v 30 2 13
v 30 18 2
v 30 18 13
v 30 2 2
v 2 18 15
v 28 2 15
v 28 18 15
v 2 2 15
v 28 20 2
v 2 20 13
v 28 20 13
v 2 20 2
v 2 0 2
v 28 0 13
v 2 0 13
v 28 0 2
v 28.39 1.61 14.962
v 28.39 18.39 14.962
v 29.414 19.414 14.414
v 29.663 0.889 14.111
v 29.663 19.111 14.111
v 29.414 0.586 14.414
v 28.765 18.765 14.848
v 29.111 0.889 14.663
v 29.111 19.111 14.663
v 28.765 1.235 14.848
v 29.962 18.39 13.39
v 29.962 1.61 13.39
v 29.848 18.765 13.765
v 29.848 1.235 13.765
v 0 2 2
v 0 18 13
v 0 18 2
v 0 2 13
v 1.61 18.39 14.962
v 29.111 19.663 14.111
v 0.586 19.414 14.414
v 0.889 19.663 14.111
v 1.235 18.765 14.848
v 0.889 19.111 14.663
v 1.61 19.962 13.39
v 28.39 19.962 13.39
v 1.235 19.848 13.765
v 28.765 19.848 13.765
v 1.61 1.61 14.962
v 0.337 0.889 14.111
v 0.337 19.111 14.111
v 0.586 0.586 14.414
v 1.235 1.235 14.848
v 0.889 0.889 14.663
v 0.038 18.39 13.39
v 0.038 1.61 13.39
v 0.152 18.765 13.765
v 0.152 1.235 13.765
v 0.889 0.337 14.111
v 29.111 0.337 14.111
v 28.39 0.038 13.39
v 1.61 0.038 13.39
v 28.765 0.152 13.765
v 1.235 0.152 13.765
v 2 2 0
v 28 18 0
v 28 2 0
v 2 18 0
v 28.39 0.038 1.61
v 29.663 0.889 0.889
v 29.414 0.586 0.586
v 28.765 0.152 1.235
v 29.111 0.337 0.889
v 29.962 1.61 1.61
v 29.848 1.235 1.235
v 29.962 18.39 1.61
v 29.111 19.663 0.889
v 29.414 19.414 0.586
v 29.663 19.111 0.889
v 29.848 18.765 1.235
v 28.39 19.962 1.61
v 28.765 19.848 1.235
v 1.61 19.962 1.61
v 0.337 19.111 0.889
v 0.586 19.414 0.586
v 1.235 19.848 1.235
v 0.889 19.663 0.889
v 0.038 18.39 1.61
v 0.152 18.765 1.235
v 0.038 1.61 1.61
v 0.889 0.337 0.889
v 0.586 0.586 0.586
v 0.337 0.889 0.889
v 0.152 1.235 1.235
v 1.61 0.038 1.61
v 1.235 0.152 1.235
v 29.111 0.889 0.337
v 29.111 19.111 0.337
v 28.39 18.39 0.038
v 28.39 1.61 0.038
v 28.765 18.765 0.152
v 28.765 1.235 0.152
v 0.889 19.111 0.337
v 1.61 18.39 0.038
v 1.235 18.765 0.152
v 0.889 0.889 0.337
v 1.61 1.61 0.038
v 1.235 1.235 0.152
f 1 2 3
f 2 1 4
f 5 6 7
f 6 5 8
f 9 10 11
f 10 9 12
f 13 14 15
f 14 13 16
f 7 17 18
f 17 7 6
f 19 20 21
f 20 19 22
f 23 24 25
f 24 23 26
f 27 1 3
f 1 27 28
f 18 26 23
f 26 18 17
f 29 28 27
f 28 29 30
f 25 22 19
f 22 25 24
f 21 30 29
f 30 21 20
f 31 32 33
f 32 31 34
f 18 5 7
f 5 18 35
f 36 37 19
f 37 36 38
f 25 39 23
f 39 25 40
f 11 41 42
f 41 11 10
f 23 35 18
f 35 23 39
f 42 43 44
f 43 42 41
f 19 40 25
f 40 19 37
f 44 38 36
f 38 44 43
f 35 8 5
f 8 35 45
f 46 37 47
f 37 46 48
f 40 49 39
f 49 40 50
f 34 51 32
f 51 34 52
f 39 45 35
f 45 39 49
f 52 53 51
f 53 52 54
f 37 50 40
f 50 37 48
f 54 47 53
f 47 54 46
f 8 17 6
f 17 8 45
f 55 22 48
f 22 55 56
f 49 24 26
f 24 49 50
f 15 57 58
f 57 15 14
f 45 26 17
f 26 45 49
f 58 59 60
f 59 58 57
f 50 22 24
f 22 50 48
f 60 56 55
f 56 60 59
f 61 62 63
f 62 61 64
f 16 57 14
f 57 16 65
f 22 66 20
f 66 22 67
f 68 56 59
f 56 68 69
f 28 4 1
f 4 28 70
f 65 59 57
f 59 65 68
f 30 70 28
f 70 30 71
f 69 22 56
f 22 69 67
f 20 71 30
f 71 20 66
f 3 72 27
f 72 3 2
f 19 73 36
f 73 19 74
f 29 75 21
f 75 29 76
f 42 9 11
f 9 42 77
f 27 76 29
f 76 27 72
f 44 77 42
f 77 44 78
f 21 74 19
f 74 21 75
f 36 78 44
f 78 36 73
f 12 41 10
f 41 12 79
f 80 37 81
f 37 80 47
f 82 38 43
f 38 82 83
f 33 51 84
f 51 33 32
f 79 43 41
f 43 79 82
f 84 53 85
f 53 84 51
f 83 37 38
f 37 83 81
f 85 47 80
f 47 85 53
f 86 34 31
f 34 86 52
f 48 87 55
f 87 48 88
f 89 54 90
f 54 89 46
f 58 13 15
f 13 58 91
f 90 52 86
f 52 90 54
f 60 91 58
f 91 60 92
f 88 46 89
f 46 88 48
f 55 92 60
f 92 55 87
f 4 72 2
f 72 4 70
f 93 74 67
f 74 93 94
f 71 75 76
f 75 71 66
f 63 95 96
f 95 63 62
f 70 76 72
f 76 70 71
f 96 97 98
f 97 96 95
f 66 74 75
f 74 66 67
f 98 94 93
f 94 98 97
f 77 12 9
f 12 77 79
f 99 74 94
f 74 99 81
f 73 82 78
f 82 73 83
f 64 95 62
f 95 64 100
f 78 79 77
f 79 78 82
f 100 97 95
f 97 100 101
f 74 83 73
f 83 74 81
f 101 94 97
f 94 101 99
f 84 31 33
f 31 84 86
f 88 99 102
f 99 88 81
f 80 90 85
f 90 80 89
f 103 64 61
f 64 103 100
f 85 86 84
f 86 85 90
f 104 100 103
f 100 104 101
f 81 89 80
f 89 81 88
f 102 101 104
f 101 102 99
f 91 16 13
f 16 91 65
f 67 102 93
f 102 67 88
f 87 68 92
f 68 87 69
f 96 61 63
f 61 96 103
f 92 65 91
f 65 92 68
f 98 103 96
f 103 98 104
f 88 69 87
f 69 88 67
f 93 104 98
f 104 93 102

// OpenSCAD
module rond_corner(rayon,deep) {
    difference() {
        cube([rayon,deep,rayon]);
        rotate([-90,0,0]) cylinder(deep, r=rayon,$fn=32);
    }
}


module rondcube(rayon,width,deep, height, top=true, bottom=true, side=true) {
    difference() {
        cube([width, deep, height]);
        if (top) {
            translate([width-rayon,0,height-rayon]) rond_corner(rayon,deep);
            translate([width,deep-rayon,height-rayon]) rotate([0,0,90]) rond_corner(rayon,width);
            translate([rayon,deep,height-rayon]) rotate([0,0,180]) rond_corner(rayon,deep);
            translate([0,rayon,height-rayon]) rotate([0,0,270]) rond_corner(rayon,width);
        }
        if (side) {
            translate([width-rayon,rayon,0]) rotate([90,0,0]) rond_corner(rayon,height);
            translate([width-rayon,deep-rayon,0]) rotate([90,0,90]) rond_corner(rayon,height);
            translate([rayon,deep-rayon,0]) rotate([90,0,180]) rond_corner(rayon,height);
            translate([rayon,rayon,0]) rotate([90,0,270]) rond_corner(rayon,height);
        }
        if (bottom) {
            translate([width-rayon,0,rayon]) rotate([0,90,0]) rond_corner(rayon,deep);
            translate([width,deep-rayon,rayon]) rotate([0,90,90]) rond_corner(rayon,width);
            translate([rayon,deep,rayon]) rotate([0,90,180]) rond_corner(rayon,deep);
            translate([0,rayon,rayon]) rotate([0,90,270]) rond_corner(rayon,width);
        }
    }
}

rondcube(2, 30, 20, 15);
